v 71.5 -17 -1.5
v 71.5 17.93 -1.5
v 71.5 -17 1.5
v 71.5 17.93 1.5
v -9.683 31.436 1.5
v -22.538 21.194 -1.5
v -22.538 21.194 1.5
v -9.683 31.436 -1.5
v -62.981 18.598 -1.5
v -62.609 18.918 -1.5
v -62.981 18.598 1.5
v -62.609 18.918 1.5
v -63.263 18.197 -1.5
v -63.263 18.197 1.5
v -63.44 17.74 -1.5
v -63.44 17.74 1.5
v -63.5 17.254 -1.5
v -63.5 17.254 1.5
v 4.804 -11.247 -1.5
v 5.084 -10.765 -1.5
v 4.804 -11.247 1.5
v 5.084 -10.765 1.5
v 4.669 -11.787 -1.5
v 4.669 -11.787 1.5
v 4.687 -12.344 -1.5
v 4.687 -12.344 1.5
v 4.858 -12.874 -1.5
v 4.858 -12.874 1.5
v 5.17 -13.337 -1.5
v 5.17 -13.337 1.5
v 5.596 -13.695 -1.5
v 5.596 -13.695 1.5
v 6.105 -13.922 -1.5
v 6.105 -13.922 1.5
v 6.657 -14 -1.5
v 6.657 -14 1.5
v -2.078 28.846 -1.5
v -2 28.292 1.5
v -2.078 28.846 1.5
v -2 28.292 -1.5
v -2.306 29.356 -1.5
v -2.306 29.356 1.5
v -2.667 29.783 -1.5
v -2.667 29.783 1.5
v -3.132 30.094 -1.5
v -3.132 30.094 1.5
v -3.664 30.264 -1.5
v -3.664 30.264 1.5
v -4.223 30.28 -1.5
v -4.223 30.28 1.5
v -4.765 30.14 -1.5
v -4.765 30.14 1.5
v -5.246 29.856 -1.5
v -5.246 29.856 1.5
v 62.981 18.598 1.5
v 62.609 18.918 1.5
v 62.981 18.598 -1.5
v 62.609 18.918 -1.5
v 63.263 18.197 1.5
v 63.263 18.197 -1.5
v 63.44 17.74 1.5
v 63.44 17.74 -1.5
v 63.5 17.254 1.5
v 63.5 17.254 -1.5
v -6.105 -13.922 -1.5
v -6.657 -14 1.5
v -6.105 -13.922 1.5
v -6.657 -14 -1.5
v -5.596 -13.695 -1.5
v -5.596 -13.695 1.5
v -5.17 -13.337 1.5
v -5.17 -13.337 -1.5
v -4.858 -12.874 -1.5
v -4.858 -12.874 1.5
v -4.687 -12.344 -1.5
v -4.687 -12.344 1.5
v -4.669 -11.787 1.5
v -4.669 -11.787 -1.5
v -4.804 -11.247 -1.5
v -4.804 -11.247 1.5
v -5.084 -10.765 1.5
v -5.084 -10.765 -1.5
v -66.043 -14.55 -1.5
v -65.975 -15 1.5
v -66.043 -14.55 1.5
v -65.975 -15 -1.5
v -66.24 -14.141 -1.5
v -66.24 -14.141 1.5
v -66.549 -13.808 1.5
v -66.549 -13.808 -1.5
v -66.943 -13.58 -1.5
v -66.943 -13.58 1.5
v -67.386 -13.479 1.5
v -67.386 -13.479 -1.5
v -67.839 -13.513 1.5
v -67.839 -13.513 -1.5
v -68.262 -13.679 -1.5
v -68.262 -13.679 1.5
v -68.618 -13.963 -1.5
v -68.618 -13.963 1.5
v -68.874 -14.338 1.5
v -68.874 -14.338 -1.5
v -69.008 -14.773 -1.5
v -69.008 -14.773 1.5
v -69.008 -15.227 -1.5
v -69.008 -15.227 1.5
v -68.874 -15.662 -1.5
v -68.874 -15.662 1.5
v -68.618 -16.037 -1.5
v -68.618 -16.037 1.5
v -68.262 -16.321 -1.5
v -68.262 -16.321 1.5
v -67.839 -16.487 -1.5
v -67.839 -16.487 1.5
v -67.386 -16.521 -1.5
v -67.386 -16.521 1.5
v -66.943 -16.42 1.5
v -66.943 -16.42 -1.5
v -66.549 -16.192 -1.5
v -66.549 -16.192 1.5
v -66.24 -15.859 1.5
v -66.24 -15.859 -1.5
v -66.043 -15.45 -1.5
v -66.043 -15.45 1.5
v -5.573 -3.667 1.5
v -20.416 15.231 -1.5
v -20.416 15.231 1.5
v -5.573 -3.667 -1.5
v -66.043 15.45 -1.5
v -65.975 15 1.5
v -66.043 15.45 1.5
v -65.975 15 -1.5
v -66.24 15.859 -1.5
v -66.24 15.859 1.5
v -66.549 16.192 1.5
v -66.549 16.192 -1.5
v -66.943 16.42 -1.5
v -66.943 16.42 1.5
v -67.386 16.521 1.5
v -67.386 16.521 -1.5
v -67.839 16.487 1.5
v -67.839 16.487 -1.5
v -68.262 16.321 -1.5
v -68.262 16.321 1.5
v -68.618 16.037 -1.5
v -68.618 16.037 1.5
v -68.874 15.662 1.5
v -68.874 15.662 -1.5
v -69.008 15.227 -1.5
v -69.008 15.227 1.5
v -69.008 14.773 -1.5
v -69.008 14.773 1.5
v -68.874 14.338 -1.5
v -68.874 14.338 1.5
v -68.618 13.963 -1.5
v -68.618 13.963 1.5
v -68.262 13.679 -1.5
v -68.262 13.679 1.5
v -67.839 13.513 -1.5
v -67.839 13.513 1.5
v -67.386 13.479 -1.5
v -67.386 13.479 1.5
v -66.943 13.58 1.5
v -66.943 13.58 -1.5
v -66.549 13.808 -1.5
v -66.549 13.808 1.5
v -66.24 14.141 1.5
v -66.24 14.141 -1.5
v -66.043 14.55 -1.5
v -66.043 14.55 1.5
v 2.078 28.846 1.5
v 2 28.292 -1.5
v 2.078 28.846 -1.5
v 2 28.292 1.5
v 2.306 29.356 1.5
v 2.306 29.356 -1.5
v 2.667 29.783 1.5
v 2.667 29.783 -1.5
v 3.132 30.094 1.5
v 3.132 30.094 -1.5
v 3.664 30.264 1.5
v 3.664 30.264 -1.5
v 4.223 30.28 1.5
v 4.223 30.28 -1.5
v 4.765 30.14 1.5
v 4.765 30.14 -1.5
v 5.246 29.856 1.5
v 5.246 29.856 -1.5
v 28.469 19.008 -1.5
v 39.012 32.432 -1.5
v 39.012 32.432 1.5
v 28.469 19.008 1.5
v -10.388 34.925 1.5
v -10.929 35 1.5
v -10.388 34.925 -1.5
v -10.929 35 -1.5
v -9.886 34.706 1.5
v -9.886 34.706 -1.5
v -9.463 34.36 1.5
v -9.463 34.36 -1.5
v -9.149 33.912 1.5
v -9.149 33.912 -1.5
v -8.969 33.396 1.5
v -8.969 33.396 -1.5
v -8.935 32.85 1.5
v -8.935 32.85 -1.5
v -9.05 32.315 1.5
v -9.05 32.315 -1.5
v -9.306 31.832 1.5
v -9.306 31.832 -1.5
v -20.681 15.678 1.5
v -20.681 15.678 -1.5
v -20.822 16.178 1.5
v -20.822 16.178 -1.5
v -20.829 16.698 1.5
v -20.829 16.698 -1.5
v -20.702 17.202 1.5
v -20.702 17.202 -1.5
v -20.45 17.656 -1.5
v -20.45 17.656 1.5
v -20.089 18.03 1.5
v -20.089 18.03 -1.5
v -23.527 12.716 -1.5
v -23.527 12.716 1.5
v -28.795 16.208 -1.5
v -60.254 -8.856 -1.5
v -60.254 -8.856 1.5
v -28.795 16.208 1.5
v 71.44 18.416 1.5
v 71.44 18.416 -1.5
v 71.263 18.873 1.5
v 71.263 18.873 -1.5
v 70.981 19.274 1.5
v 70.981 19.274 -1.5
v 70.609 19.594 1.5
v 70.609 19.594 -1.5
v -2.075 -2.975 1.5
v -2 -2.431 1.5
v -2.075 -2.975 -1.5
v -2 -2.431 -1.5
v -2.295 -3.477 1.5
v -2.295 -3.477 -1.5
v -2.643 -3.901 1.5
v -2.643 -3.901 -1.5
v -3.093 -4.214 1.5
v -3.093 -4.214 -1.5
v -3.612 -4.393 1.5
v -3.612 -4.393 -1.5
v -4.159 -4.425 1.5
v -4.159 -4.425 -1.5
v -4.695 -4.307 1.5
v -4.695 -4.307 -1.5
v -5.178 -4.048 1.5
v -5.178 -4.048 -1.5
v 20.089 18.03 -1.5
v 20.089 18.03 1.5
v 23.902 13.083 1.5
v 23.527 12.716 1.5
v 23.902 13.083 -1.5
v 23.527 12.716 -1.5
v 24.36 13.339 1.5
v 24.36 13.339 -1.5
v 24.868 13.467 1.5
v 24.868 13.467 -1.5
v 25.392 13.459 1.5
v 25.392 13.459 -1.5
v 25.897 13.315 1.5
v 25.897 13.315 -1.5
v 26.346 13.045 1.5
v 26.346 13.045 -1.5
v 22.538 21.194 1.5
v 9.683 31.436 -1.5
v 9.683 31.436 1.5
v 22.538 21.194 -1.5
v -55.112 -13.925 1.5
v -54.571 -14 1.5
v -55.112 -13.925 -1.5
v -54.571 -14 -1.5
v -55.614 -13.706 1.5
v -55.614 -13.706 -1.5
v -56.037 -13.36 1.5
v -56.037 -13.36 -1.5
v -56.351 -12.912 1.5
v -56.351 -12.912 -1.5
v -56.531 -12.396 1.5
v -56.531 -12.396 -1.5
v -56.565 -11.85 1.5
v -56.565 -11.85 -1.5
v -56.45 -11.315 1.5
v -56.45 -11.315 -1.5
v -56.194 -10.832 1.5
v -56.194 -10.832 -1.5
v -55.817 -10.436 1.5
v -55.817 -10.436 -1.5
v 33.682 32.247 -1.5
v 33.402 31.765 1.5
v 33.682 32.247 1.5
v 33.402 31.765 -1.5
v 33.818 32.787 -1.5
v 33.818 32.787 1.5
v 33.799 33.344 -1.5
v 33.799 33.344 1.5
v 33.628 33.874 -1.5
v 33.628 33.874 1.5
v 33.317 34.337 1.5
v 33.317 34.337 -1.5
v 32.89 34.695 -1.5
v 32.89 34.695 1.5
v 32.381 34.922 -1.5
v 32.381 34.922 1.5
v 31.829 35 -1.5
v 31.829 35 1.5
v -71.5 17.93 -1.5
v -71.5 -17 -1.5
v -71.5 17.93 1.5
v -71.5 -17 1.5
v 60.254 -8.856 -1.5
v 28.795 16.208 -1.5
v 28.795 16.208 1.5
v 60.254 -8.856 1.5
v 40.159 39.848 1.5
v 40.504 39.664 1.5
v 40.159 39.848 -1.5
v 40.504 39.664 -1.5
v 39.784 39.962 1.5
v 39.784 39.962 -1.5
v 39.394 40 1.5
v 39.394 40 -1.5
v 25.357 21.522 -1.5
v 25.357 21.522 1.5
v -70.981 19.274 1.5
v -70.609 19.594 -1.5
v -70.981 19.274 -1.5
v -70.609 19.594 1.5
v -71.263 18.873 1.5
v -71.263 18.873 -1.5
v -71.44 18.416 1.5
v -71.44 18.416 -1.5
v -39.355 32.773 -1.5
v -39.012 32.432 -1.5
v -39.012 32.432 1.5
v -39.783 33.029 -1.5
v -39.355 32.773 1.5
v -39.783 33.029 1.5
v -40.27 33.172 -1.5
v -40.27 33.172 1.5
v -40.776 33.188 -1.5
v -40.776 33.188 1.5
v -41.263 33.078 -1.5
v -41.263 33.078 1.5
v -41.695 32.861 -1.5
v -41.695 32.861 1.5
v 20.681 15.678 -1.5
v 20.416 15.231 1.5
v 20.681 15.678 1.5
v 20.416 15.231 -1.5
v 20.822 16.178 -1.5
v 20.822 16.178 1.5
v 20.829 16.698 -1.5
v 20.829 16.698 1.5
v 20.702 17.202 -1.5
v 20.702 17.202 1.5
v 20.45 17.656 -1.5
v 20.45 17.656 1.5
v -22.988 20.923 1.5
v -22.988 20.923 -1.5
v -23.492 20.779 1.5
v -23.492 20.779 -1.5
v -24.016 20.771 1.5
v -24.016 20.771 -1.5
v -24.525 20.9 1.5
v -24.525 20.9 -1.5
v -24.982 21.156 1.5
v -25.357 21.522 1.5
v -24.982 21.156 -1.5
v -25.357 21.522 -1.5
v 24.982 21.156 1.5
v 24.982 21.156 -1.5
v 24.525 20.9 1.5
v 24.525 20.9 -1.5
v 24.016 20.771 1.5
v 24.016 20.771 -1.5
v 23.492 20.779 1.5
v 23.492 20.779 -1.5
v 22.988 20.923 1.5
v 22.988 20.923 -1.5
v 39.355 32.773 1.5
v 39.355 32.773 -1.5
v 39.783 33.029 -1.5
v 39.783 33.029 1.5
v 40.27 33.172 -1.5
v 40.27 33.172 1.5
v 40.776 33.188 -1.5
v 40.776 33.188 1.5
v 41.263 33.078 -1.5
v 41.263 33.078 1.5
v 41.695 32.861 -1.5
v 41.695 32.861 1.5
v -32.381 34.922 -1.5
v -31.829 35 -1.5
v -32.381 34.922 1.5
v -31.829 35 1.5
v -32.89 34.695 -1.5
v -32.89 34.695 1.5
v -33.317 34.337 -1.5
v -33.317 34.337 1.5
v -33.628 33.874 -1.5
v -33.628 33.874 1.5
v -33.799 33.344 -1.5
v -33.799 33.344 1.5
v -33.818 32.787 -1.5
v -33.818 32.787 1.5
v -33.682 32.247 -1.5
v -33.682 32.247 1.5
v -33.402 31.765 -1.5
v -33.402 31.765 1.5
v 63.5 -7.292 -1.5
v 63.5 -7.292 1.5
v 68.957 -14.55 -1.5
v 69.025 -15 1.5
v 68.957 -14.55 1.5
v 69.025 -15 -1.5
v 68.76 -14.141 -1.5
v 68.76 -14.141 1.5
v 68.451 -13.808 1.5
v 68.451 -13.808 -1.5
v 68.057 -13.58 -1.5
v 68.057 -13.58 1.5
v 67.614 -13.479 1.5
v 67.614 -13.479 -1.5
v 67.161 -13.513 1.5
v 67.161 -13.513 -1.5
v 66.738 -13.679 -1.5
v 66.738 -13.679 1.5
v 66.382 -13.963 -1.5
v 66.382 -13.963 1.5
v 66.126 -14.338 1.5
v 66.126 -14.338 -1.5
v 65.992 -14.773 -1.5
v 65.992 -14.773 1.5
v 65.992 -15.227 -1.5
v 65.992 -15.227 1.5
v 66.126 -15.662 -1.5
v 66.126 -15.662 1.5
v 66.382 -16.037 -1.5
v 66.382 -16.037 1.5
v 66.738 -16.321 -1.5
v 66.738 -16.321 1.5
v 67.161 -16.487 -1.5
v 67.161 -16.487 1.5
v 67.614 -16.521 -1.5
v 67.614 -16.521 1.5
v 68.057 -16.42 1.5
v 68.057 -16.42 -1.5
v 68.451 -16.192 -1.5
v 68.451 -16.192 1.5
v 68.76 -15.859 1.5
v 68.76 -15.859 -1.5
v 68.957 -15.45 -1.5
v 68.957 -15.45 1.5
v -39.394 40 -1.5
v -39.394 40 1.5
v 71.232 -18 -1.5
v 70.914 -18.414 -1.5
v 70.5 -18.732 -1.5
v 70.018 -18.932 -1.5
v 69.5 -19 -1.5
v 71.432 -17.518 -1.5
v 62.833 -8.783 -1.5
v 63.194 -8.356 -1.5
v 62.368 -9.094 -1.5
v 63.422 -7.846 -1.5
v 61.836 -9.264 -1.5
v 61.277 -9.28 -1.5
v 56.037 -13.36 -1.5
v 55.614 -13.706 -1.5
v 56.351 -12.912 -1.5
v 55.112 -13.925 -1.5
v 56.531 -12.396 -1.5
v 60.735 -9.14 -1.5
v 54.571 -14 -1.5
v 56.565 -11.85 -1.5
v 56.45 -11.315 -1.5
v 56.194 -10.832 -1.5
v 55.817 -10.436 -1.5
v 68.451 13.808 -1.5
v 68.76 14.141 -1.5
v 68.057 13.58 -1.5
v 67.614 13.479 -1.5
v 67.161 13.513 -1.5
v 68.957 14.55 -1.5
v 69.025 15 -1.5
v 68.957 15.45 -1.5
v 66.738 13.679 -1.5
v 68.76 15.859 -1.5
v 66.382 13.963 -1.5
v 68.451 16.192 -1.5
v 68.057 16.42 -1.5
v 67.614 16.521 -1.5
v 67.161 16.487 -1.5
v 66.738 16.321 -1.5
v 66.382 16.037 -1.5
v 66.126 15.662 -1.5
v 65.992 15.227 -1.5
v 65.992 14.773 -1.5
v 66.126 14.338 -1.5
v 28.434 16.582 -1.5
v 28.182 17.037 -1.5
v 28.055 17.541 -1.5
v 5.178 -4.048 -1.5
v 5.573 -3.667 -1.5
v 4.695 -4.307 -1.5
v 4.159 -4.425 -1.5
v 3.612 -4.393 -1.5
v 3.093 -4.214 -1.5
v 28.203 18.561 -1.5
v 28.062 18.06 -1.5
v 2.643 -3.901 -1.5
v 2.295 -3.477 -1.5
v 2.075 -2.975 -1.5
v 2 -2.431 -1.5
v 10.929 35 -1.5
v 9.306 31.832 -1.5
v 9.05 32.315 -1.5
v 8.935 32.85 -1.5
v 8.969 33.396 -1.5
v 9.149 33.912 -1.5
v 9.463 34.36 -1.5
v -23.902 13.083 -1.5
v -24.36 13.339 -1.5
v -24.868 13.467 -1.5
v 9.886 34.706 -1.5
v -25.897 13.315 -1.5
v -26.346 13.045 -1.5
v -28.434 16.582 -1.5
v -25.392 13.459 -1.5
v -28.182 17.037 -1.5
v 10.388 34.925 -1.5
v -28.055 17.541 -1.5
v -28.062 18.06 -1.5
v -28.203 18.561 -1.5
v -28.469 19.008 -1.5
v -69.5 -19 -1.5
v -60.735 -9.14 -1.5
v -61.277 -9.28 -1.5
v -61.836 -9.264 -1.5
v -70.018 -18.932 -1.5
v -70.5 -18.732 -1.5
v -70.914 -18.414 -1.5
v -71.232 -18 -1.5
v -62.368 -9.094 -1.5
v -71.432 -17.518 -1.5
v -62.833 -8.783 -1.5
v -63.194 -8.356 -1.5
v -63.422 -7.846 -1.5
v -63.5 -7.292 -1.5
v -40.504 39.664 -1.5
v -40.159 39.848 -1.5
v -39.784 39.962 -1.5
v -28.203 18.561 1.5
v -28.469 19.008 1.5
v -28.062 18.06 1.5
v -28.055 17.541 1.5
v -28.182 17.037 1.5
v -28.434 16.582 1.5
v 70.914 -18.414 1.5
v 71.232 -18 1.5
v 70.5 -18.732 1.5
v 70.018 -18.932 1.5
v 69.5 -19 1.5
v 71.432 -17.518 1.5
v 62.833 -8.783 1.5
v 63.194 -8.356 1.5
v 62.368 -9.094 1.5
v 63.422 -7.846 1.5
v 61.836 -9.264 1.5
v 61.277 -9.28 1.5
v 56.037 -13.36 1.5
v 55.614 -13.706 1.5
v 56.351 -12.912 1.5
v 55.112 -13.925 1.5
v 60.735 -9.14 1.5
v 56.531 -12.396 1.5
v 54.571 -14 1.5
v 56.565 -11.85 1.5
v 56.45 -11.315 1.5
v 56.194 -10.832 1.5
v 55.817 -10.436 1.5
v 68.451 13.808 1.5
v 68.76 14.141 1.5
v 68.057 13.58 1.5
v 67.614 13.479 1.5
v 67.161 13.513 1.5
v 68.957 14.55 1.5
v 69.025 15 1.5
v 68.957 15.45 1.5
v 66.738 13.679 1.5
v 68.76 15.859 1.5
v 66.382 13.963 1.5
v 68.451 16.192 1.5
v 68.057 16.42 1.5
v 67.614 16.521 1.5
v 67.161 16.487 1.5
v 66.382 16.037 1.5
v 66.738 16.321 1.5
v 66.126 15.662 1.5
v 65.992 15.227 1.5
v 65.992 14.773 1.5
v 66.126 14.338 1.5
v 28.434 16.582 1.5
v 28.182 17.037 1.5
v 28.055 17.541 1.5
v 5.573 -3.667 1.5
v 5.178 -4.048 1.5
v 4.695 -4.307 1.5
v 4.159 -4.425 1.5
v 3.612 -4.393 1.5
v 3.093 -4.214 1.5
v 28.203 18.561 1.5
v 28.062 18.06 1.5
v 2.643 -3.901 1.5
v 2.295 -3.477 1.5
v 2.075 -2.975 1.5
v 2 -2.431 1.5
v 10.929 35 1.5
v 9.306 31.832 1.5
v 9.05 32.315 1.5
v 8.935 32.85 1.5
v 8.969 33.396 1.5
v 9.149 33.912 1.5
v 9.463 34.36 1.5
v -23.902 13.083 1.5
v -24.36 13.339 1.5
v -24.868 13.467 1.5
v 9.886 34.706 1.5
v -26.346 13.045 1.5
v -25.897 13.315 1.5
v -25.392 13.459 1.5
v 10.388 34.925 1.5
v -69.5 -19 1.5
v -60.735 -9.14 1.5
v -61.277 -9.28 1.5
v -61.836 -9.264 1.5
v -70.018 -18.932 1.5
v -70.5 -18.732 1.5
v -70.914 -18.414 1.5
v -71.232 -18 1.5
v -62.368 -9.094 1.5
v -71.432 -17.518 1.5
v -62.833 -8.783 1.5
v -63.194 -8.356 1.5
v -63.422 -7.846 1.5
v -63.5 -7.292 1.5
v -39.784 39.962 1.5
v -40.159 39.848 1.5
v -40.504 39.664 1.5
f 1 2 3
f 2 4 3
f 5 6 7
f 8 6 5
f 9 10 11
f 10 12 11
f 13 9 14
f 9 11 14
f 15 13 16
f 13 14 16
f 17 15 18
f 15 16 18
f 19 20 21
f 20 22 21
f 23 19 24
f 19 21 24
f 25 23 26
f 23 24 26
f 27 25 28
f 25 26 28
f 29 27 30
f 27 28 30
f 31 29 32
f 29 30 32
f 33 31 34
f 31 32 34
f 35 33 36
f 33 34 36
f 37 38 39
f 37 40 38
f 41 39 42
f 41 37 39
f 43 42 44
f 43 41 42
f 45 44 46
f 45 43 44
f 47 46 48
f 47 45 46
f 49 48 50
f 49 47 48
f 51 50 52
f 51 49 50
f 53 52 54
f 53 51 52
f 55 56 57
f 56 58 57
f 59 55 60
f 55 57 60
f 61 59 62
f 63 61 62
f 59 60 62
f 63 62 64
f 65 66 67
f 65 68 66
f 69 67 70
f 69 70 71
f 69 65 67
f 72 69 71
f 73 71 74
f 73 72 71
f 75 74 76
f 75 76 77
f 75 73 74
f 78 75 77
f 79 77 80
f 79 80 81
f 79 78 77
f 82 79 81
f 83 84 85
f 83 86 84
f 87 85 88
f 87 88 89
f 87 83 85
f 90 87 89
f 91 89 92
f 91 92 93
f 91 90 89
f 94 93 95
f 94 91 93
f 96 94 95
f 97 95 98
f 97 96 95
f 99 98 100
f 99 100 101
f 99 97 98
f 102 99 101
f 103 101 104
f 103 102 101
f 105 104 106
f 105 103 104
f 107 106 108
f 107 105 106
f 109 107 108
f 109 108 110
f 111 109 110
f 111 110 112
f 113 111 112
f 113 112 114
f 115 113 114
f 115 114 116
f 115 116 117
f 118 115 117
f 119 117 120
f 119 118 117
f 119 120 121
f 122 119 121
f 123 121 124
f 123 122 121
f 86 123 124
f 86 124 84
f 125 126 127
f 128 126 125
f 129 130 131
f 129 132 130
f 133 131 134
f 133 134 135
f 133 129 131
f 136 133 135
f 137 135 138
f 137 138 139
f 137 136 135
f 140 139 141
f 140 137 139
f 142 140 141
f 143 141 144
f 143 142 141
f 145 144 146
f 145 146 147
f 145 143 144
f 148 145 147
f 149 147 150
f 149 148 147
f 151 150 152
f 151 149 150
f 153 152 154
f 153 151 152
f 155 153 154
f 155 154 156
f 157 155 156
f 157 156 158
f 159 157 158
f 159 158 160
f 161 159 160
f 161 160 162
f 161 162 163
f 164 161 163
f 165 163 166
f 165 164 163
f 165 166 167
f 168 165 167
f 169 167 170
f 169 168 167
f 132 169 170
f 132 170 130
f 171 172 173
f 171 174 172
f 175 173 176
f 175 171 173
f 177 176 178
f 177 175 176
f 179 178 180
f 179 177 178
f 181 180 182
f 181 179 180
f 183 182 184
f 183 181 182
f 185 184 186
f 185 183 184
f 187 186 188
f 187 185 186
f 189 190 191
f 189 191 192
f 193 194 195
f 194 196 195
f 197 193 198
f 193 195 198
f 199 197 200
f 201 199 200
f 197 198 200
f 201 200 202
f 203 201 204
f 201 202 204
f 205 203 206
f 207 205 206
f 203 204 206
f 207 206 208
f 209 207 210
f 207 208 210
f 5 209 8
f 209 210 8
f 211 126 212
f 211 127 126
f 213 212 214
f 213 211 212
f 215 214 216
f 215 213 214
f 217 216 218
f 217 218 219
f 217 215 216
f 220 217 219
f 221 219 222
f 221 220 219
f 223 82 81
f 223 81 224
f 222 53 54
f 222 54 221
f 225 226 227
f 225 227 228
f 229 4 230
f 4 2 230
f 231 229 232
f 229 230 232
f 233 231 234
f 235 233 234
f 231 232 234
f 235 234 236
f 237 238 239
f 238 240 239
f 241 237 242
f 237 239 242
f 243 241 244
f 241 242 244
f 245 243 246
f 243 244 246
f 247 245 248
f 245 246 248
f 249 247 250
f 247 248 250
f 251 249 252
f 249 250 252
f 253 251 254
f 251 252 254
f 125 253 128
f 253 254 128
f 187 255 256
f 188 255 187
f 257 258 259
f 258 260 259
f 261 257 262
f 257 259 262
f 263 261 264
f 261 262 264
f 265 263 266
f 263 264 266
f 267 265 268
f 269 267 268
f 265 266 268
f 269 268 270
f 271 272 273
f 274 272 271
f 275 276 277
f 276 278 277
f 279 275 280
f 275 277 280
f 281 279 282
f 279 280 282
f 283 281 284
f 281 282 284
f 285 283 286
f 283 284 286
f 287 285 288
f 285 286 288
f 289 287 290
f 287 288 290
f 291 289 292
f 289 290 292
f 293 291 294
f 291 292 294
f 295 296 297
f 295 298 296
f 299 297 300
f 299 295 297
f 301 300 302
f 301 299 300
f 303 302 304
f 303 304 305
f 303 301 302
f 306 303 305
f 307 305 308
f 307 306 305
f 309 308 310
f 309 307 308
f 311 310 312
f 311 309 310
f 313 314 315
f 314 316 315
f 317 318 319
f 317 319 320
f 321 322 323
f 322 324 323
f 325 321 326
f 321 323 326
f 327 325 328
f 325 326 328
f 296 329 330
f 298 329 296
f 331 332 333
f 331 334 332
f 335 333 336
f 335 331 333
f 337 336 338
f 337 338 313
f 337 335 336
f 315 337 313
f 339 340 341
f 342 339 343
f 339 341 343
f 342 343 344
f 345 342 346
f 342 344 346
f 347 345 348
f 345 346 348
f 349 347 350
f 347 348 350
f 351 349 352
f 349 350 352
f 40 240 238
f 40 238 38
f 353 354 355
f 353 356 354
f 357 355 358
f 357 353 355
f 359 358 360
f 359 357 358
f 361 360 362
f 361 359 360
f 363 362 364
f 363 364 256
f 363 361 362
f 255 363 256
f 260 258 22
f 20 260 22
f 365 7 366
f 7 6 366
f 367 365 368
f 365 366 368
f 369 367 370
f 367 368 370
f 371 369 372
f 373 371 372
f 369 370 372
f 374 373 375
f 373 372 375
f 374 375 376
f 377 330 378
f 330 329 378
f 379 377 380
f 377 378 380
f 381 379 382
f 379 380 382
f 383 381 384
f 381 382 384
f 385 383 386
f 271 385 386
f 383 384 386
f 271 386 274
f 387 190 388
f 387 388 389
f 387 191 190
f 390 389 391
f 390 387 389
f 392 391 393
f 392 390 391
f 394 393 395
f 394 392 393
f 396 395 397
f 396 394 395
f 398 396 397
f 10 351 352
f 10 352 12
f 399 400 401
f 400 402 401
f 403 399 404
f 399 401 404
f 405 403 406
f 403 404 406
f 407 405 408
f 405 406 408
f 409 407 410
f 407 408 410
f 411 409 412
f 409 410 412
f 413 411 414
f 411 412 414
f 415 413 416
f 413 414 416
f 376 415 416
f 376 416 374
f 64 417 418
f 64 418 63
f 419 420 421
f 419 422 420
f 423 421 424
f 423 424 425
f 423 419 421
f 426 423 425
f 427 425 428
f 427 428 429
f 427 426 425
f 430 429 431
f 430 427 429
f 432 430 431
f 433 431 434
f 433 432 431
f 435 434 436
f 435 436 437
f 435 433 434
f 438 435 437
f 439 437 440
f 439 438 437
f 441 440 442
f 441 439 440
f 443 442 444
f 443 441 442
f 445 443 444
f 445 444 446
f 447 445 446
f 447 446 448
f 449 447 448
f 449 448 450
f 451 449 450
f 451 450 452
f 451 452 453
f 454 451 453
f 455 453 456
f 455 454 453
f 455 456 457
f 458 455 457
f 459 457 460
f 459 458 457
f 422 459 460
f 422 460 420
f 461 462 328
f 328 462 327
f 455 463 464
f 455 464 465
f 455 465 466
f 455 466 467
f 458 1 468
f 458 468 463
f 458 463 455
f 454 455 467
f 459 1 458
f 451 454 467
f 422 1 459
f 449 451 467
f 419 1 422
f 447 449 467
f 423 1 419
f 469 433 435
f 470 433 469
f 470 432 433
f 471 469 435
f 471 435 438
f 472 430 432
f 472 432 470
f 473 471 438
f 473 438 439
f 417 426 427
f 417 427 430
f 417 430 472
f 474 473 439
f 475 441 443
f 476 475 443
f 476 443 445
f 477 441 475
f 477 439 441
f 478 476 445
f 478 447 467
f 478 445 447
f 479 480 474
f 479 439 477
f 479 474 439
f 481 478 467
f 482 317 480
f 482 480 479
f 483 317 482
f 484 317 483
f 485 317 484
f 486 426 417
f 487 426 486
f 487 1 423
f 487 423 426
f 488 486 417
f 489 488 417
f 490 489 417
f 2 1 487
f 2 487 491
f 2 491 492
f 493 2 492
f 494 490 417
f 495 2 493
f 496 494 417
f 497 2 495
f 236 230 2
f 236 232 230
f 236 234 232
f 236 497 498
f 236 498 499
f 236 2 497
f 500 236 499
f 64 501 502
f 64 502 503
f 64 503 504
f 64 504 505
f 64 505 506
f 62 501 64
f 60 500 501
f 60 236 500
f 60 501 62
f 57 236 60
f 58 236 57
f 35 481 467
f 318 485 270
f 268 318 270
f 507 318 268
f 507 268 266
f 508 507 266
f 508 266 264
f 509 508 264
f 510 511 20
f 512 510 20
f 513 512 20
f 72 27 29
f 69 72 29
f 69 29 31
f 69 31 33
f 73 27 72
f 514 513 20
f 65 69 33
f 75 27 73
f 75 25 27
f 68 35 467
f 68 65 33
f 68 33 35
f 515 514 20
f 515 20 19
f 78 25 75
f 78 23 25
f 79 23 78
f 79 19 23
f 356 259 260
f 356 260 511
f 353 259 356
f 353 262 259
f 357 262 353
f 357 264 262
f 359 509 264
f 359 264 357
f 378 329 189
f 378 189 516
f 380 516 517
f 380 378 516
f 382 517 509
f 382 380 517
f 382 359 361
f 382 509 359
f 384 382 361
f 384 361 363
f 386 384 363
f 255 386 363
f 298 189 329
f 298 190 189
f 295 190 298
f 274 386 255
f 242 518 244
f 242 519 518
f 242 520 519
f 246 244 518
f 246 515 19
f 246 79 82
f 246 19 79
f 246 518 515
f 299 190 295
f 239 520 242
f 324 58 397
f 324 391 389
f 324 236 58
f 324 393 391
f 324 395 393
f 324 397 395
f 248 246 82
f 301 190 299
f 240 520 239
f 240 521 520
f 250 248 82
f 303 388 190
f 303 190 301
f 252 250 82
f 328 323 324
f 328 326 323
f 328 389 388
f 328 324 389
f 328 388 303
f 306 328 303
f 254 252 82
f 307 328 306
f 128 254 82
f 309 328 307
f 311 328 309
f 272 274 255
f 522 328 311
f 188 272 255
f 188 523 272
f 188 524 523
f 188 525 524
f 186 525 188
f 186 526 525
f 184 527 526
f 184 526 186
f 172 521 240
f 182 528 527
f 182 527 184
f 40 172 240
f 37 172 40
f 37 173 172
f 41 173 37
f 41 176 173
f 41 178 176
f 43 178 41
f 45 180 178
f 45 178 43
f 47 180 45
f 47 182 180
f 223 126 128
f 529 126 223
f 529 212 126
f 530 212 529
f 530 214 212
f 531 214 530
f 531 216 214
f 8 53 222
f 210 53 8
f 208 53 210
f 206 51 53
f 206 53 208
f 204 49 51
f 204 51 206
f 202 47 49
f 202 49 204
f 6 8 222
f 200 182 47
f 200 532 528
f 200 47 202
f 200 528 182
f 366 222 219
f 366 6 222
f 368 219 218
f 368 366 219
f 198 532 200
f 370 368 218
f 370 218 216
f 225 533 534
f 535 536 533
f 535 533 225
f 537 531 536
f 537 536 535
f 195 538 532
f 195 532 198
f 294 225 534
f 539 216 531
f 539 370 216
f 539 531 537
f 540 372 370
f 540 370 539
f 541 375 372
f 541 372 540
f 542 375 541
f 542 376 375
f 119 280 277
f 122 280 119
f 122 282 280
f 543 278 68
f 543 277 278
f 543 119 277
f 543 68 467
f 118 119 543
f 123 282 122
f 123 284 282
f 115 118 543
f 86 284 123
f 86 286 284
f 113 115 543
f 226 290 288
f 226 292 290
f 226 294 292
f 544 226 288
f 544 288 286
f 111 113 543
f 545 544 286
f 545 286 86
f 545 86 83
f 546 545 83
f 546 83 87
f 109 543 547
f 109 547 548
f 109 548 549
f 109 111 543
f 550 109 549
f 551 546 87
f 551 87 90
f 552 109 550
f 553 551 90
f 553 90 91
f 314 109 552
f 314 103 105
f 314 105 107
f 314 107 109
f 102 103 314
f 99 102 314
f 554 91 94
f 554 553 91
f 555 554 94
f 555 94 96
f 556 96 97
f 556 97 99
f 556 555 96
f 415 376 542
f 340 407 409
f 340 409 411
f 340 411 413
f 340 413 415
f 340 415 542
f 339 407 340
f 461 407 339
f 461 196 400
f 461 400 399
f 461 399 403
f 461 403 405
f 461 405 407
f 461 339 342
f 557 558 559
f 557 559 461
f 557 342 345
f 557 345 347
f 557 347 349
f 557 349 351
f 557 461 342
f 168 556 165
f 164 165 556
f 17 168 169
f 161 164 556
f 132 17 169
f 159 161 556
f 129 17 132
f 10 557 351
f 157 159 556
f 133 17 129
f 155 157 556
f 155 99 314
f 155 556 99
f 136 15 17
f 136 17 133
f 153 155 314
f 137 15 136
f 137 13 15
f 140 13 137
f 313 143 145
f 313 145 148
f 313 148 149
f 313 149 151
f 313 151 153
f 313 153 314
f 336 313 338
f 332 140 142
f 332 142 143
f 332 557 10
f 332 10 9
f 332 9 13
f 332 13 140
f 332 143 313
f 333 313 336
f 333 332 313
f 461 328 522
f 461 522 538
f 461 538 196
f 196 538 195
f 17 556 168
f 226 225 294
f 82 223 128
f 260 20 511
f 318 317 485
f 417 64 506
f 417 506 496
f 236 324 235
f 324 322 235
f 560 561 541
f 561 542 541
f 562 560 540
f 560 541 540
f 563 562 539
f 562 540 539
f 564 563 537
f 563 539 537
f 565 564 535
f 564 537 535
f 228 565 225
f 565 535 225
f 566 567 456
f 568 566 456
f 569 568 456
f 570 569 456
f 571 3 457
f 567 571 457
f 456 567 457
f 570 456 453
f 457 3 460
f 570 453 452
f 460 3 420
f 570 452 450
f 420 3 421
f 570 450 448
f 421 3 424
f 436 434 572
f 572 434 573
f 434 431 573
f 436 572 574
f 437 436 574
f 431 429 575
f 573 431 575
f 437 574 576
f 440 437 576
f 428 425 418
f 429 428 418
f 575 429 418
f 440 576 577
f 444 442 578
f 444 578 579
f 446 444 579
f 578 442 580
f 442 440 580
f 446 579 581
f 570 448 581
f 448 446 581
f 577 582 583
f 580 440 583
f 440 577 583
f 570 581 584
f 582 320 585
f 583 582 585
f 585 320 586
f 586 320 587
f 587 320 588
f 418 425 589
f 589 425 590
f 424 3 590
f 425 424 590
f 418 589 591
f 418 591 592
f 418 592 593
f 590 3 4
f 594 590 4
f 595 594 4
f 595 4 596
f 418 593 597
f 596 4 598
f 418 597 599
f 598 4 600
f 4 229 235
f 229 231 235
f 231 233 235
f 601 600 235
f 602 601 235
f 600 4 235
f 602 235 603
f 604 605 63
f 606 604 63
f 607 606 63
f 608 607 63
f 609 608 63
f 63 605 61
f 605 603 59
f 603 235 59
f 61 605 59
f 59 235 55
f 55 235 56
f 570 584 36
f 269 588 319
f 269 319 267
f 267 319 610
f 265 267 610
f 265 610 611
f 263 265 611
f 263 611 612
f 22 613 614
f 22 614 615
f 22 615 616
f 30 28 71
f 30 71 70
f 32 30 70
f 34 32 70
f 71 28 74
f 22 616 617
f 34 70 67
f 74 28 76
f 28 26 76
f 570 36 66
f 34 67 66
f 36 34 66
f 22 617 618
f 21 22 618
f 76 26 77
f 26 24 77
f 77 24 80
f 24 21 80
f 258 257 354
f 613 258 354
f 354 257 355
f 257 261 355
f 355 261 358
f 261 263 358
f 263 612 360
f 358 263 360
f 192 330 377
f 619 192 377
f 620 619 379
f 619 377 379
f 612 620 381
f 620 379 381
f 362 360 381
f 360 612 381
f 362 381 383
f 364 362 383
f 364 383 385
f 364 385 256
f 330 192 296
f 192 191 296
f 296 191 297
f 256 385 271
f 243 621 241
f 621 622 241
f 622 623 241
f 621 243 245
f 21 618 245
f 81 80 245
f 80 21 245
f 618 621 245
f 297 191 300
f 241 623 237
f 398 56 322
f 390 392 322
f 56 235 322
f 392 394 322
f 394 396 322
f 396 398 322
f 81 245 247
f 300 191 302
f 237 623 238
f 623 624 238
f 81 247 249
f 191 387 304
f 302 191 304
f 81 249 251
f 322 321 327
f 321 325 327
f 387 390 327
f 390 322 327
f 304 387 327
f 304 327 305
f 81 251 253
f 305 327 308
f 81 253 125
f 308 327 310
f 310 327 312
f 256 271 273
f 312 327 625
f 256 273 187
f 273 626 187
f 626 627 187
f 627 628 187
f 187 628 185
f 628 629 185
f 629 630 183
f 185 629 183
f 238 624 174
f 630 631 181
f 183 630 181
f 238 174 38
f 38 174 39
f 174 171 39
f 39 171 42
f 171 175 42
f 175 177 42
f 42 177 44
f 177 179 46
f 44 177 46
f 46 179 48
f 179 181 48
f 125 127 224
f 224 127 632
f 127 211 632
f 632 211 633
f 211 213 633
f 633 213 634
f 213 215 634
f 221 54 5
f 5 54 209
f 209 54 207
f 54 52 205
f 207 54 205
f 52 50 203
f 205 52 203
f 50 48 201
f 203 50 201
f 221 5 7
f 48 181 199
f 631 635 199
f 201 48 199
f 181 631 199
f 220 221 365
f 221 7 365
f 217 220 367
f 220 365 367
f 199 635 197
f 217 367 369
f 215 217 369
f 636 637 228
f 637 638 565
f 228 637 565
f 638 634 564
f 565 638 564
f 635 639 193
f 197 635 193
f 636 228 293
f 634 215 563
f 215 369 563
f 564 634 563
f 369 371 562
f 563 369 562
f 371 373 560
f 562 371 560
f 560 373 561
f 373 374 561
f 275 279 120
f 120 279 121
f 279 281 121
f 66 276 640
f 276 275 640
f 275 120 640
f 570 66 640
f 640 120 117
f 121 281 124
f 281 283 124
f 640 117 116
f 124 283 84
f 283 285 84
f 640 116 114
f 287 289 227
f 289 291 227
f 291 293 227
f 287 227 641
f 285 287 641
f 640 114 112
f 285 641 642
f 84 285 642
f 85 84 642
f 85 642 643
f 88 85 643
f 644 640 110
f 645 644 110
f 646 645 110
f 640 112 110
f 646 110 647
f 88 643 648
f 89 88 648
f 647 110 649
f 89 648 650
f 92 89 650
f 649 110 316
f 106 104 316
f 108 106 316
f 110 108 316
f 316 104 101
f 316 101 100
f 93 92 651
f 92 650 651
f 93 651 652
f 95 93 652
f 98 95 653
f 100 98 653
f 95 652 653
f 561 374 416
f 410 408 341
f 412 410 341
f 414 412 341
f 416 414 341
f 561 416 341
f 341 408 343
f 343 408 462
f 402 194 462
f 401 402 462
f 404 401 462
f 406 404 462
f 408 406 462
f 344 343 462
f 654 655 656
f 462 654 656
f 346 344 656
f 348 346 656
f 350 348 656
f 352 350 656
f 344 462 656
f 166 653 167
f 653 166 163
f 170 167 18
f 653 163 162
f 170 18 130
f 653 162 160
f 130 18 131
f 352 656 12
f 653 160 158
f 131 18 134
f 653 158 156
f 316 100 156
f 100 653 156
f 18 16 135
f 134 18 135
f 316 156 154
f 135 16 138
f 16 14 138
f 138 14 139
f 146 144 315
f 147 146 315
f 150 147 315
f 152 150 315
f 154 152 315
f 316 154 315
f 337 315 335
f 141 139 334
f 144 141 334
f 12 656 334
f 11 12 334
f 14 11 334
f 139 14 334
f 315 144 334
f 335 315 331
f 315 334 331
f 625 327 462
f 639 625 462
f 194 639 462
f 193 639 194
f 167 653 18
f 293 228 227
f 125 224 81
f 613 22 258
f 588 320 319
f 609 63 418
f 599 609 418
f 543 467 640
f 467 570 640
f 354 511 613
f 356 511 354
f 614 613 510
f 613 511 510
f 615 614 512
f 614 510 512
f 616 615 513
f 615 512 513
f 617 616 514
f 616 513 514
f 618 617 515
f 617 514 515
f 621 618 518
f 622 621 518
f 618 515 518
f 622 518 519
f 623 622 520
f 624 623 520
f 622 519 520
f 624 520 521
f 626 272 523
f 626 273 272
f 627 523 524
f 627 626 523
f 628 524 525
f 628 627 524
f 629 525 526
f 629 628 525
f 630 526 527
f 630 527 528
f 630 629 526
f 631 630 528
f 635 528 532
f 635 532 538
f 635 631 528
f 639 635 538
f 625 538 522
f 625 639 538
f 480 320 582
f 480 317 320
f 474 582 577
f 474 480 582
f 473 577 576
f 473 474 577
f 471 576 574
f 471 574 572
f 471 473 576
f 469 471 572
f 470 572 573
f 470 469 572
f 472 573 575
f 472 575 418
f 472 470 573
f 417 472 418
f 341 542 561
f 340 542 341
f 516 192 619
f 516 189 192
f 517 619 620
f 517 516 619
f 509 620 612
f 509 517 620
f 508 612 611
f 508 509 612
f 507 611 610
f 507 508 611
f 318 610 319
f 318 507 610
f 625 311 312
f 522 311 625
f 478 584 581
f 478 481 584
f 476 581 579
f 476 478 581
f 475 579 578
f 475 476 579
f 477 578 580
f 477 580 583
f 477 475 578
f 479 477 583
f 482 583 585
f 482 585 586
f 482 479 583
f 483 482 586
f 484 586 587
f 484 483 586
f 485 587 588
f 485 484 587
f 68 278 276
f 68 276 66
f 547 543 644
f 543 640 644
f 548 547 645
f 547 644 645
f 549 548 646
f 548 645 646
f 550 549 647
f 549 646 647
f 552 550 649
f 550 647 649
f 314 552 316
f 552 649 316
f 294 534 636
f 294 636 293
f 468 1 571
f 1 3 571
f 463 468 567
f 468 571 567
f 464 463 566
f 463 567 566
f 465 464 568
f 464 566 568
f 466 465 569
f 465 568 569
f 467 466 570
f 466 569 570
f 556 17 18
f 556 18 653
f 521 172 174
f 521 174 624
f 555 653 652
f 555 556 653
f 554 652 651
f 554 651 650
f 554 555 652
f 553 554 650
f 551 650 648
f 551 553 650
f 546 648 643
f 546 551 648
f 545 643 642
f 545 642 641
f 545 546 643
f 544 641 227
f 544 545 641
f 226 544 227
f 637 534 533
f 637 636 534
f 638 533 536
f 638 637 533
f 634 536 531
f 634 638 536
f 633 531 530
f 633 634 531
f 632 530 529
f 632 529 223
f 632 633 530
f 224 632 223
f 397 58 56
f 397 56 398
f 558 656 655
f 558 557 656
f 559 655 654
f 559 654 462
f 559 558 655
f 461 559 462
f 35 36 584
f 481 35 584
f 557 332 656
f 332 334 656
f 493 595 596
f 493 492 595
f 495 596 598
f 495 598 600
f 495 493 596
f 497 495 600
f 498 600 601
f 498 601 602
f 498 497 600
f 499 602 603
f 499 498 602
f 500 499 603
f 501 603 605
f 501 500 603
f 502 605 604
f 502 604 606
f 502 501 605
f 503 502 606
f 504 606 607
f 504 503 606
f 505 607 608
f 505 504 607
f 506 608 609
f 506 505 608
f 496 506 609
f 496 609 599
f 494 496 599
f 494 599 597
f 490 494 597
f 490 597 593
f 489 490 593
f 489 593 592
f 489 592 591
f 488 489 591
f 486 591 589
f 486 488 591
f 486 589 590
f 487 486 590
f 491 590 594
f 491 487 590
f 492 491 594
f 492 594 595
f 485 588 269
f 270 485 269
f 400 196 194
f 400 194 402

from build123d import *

# Parameters (mm, degrees)
SKETCH_1_R          = 1.525
EXTRUDE_1_DEPTH     = 1.5
FILLET_1_R          = 2
CUT_EXTRUDE_1_DEPTH = 11.5
EXTRUDE_2_DEPTH     = 3
FILLET_2_R          = 2


with BuildPart() as part:
    # 草图1 → 凸台-拉伸1 (new, symmetric)
    with BuildSketch(Plane.XY):
        Polygon((-71.5, 19), (-40, 40), (40, 40), (71.5, 19), (71.5, -19), (-71.5, -19), align=None)
        with Locations((67.5, 15)):
            Circle(SKETCH_1_R, mode=Mode.SUBTRACT)
        with Locations((67.5, -15)):
            Circle(SKETCH_1_R, mode=Mode.SUBTRACT)
        with Locations((-67.5, -15)):
            Circle(SKETCH_1_R, mode=Mode.SUBTRACT)
        with Locations((-67.5, 15)):
            Circle(SKETCH_1_R, mode=Mode.SUBTRACT)
    extrude(amount=EXTRUDE_1_DEPTH, both=True)

    # 圆角1
    fillet_1_edges = [part.edges().sort_by_distance(p)[0] for p in [
        (71.5, 19, 0),
        (71.5, -19, 0),
        (-71.5, -19, 0),
        (-71.5, 19, 0),
        (-40, 40, 0),
        (40, 40, 0),
    ]]
    fillet(fillet_1_edges, radius=FILLET_1_R)

    # 草图2 → 切除-拉伸1 (cut, symmetric)
    with BuildSketch(Plane.XY.offset(1.5)):
        Polygon((-2.543149186, -14), (-24.770935731, 14.300111558), (-60.290463502, -14), align=None)
        Polygon((-40.058974879, 33.764632352), (-38.486121811, 35), (-63.5, 18.324081208), (-63.5, -11.442808319), (-27.241730885, 17.445893903), align=None)
        Polygon((-5.209536498, 35), (-35.942972625, 35), (-24.113223205, 19.938526038), align=None)
        Polygon((-2, 32.442808319), (-21.642428051, 16.792743692), (-2, -8.215725055), align=None)
        Polygon((21.642428051, 16.792743692), (2, 32.442808319), (2, -8.215725055), align=None)
        Polygon((35.942972625, 35), (5.209536498, 35), (24.113223205, 19.938526038), align=None)
        Polygon((63.5, 18.324081208), (38.486121811, 35), (40.058974879, 33.764632352), (27.241730885, 17.445893903), (63.5, -11.442808319), align=None)
        Polygon((24.770935731, 14.300111558), (2.543149186, -14), (60.290463502, -14), align=None)
    extrude(amount=CUT_EXTRUDE_1_DEPTH, both=True, mode=Mode.SUBTRACT)

    # 草图3 → 凸台-拉伸2 (add)
    with BuildSketch(Plane.XY.offset(1.5)):
        Polygon((40.058974879, 33.764632352), (40.676658703, 34.551058886), (38.486121811, 35), align=None)
    extrude_2 = extrude(amount=-EXTRUDE_2_DEPTH)

    # 镜向1: 凸台-拉伸2 across plane
    add(extrude_2.mirror(Plane(origin=(0, 0, 0), x_dir=(0, 0, 1), z_dir=(1, 0, 0))))

    # 圆角2
    fillet_2_edges = [part.edges().sort_by_distance(p)[0] for p in [
        (2, 32.442808319, 0),
        (21.642428051, 16.792743692, 0),
        (2, -8.215725055, 0),
        (-21.642428051, 16.792743692, 0),
        (-2, 32.442808319, 0),
        (-2, -8.215725055, 0),
        (-63.5, -11.442808319, 0),
        (-63.5, 18.324081208, 0),
        (-27.241730885, 17.445893903, 0),
        (-24.113223205, 19.938526038, 0),
        (-35.942972625, 35, 0),
        (-5.209536498, 35, 0),
        (24.770935731, 14.300111558, 0),
        (60.290463502, -14, 0),
        (2.543149186, -14, 0),
        (5.209536498, 35, 0),
        (35.942972625, 35, 0),
        (24.113223205, 19.938526038, 0),
        (27.241730885, 17.445893903, 0),
        (63.5, 18.324081208, 0),
        (63.5, -11.442808319, 0),
        (-60.290463502, -14, 0),
        (-24.770935731, 14.300111558, 0),
        (-2.543149186, -14, 0),
        (40.155270293, 33.887234346, 0),
        (-40.155270293, 33.887234346, 0),
    ]]
    fillet(fillet_2_edges, radius=FILLET_2_R)


solid = part.part
